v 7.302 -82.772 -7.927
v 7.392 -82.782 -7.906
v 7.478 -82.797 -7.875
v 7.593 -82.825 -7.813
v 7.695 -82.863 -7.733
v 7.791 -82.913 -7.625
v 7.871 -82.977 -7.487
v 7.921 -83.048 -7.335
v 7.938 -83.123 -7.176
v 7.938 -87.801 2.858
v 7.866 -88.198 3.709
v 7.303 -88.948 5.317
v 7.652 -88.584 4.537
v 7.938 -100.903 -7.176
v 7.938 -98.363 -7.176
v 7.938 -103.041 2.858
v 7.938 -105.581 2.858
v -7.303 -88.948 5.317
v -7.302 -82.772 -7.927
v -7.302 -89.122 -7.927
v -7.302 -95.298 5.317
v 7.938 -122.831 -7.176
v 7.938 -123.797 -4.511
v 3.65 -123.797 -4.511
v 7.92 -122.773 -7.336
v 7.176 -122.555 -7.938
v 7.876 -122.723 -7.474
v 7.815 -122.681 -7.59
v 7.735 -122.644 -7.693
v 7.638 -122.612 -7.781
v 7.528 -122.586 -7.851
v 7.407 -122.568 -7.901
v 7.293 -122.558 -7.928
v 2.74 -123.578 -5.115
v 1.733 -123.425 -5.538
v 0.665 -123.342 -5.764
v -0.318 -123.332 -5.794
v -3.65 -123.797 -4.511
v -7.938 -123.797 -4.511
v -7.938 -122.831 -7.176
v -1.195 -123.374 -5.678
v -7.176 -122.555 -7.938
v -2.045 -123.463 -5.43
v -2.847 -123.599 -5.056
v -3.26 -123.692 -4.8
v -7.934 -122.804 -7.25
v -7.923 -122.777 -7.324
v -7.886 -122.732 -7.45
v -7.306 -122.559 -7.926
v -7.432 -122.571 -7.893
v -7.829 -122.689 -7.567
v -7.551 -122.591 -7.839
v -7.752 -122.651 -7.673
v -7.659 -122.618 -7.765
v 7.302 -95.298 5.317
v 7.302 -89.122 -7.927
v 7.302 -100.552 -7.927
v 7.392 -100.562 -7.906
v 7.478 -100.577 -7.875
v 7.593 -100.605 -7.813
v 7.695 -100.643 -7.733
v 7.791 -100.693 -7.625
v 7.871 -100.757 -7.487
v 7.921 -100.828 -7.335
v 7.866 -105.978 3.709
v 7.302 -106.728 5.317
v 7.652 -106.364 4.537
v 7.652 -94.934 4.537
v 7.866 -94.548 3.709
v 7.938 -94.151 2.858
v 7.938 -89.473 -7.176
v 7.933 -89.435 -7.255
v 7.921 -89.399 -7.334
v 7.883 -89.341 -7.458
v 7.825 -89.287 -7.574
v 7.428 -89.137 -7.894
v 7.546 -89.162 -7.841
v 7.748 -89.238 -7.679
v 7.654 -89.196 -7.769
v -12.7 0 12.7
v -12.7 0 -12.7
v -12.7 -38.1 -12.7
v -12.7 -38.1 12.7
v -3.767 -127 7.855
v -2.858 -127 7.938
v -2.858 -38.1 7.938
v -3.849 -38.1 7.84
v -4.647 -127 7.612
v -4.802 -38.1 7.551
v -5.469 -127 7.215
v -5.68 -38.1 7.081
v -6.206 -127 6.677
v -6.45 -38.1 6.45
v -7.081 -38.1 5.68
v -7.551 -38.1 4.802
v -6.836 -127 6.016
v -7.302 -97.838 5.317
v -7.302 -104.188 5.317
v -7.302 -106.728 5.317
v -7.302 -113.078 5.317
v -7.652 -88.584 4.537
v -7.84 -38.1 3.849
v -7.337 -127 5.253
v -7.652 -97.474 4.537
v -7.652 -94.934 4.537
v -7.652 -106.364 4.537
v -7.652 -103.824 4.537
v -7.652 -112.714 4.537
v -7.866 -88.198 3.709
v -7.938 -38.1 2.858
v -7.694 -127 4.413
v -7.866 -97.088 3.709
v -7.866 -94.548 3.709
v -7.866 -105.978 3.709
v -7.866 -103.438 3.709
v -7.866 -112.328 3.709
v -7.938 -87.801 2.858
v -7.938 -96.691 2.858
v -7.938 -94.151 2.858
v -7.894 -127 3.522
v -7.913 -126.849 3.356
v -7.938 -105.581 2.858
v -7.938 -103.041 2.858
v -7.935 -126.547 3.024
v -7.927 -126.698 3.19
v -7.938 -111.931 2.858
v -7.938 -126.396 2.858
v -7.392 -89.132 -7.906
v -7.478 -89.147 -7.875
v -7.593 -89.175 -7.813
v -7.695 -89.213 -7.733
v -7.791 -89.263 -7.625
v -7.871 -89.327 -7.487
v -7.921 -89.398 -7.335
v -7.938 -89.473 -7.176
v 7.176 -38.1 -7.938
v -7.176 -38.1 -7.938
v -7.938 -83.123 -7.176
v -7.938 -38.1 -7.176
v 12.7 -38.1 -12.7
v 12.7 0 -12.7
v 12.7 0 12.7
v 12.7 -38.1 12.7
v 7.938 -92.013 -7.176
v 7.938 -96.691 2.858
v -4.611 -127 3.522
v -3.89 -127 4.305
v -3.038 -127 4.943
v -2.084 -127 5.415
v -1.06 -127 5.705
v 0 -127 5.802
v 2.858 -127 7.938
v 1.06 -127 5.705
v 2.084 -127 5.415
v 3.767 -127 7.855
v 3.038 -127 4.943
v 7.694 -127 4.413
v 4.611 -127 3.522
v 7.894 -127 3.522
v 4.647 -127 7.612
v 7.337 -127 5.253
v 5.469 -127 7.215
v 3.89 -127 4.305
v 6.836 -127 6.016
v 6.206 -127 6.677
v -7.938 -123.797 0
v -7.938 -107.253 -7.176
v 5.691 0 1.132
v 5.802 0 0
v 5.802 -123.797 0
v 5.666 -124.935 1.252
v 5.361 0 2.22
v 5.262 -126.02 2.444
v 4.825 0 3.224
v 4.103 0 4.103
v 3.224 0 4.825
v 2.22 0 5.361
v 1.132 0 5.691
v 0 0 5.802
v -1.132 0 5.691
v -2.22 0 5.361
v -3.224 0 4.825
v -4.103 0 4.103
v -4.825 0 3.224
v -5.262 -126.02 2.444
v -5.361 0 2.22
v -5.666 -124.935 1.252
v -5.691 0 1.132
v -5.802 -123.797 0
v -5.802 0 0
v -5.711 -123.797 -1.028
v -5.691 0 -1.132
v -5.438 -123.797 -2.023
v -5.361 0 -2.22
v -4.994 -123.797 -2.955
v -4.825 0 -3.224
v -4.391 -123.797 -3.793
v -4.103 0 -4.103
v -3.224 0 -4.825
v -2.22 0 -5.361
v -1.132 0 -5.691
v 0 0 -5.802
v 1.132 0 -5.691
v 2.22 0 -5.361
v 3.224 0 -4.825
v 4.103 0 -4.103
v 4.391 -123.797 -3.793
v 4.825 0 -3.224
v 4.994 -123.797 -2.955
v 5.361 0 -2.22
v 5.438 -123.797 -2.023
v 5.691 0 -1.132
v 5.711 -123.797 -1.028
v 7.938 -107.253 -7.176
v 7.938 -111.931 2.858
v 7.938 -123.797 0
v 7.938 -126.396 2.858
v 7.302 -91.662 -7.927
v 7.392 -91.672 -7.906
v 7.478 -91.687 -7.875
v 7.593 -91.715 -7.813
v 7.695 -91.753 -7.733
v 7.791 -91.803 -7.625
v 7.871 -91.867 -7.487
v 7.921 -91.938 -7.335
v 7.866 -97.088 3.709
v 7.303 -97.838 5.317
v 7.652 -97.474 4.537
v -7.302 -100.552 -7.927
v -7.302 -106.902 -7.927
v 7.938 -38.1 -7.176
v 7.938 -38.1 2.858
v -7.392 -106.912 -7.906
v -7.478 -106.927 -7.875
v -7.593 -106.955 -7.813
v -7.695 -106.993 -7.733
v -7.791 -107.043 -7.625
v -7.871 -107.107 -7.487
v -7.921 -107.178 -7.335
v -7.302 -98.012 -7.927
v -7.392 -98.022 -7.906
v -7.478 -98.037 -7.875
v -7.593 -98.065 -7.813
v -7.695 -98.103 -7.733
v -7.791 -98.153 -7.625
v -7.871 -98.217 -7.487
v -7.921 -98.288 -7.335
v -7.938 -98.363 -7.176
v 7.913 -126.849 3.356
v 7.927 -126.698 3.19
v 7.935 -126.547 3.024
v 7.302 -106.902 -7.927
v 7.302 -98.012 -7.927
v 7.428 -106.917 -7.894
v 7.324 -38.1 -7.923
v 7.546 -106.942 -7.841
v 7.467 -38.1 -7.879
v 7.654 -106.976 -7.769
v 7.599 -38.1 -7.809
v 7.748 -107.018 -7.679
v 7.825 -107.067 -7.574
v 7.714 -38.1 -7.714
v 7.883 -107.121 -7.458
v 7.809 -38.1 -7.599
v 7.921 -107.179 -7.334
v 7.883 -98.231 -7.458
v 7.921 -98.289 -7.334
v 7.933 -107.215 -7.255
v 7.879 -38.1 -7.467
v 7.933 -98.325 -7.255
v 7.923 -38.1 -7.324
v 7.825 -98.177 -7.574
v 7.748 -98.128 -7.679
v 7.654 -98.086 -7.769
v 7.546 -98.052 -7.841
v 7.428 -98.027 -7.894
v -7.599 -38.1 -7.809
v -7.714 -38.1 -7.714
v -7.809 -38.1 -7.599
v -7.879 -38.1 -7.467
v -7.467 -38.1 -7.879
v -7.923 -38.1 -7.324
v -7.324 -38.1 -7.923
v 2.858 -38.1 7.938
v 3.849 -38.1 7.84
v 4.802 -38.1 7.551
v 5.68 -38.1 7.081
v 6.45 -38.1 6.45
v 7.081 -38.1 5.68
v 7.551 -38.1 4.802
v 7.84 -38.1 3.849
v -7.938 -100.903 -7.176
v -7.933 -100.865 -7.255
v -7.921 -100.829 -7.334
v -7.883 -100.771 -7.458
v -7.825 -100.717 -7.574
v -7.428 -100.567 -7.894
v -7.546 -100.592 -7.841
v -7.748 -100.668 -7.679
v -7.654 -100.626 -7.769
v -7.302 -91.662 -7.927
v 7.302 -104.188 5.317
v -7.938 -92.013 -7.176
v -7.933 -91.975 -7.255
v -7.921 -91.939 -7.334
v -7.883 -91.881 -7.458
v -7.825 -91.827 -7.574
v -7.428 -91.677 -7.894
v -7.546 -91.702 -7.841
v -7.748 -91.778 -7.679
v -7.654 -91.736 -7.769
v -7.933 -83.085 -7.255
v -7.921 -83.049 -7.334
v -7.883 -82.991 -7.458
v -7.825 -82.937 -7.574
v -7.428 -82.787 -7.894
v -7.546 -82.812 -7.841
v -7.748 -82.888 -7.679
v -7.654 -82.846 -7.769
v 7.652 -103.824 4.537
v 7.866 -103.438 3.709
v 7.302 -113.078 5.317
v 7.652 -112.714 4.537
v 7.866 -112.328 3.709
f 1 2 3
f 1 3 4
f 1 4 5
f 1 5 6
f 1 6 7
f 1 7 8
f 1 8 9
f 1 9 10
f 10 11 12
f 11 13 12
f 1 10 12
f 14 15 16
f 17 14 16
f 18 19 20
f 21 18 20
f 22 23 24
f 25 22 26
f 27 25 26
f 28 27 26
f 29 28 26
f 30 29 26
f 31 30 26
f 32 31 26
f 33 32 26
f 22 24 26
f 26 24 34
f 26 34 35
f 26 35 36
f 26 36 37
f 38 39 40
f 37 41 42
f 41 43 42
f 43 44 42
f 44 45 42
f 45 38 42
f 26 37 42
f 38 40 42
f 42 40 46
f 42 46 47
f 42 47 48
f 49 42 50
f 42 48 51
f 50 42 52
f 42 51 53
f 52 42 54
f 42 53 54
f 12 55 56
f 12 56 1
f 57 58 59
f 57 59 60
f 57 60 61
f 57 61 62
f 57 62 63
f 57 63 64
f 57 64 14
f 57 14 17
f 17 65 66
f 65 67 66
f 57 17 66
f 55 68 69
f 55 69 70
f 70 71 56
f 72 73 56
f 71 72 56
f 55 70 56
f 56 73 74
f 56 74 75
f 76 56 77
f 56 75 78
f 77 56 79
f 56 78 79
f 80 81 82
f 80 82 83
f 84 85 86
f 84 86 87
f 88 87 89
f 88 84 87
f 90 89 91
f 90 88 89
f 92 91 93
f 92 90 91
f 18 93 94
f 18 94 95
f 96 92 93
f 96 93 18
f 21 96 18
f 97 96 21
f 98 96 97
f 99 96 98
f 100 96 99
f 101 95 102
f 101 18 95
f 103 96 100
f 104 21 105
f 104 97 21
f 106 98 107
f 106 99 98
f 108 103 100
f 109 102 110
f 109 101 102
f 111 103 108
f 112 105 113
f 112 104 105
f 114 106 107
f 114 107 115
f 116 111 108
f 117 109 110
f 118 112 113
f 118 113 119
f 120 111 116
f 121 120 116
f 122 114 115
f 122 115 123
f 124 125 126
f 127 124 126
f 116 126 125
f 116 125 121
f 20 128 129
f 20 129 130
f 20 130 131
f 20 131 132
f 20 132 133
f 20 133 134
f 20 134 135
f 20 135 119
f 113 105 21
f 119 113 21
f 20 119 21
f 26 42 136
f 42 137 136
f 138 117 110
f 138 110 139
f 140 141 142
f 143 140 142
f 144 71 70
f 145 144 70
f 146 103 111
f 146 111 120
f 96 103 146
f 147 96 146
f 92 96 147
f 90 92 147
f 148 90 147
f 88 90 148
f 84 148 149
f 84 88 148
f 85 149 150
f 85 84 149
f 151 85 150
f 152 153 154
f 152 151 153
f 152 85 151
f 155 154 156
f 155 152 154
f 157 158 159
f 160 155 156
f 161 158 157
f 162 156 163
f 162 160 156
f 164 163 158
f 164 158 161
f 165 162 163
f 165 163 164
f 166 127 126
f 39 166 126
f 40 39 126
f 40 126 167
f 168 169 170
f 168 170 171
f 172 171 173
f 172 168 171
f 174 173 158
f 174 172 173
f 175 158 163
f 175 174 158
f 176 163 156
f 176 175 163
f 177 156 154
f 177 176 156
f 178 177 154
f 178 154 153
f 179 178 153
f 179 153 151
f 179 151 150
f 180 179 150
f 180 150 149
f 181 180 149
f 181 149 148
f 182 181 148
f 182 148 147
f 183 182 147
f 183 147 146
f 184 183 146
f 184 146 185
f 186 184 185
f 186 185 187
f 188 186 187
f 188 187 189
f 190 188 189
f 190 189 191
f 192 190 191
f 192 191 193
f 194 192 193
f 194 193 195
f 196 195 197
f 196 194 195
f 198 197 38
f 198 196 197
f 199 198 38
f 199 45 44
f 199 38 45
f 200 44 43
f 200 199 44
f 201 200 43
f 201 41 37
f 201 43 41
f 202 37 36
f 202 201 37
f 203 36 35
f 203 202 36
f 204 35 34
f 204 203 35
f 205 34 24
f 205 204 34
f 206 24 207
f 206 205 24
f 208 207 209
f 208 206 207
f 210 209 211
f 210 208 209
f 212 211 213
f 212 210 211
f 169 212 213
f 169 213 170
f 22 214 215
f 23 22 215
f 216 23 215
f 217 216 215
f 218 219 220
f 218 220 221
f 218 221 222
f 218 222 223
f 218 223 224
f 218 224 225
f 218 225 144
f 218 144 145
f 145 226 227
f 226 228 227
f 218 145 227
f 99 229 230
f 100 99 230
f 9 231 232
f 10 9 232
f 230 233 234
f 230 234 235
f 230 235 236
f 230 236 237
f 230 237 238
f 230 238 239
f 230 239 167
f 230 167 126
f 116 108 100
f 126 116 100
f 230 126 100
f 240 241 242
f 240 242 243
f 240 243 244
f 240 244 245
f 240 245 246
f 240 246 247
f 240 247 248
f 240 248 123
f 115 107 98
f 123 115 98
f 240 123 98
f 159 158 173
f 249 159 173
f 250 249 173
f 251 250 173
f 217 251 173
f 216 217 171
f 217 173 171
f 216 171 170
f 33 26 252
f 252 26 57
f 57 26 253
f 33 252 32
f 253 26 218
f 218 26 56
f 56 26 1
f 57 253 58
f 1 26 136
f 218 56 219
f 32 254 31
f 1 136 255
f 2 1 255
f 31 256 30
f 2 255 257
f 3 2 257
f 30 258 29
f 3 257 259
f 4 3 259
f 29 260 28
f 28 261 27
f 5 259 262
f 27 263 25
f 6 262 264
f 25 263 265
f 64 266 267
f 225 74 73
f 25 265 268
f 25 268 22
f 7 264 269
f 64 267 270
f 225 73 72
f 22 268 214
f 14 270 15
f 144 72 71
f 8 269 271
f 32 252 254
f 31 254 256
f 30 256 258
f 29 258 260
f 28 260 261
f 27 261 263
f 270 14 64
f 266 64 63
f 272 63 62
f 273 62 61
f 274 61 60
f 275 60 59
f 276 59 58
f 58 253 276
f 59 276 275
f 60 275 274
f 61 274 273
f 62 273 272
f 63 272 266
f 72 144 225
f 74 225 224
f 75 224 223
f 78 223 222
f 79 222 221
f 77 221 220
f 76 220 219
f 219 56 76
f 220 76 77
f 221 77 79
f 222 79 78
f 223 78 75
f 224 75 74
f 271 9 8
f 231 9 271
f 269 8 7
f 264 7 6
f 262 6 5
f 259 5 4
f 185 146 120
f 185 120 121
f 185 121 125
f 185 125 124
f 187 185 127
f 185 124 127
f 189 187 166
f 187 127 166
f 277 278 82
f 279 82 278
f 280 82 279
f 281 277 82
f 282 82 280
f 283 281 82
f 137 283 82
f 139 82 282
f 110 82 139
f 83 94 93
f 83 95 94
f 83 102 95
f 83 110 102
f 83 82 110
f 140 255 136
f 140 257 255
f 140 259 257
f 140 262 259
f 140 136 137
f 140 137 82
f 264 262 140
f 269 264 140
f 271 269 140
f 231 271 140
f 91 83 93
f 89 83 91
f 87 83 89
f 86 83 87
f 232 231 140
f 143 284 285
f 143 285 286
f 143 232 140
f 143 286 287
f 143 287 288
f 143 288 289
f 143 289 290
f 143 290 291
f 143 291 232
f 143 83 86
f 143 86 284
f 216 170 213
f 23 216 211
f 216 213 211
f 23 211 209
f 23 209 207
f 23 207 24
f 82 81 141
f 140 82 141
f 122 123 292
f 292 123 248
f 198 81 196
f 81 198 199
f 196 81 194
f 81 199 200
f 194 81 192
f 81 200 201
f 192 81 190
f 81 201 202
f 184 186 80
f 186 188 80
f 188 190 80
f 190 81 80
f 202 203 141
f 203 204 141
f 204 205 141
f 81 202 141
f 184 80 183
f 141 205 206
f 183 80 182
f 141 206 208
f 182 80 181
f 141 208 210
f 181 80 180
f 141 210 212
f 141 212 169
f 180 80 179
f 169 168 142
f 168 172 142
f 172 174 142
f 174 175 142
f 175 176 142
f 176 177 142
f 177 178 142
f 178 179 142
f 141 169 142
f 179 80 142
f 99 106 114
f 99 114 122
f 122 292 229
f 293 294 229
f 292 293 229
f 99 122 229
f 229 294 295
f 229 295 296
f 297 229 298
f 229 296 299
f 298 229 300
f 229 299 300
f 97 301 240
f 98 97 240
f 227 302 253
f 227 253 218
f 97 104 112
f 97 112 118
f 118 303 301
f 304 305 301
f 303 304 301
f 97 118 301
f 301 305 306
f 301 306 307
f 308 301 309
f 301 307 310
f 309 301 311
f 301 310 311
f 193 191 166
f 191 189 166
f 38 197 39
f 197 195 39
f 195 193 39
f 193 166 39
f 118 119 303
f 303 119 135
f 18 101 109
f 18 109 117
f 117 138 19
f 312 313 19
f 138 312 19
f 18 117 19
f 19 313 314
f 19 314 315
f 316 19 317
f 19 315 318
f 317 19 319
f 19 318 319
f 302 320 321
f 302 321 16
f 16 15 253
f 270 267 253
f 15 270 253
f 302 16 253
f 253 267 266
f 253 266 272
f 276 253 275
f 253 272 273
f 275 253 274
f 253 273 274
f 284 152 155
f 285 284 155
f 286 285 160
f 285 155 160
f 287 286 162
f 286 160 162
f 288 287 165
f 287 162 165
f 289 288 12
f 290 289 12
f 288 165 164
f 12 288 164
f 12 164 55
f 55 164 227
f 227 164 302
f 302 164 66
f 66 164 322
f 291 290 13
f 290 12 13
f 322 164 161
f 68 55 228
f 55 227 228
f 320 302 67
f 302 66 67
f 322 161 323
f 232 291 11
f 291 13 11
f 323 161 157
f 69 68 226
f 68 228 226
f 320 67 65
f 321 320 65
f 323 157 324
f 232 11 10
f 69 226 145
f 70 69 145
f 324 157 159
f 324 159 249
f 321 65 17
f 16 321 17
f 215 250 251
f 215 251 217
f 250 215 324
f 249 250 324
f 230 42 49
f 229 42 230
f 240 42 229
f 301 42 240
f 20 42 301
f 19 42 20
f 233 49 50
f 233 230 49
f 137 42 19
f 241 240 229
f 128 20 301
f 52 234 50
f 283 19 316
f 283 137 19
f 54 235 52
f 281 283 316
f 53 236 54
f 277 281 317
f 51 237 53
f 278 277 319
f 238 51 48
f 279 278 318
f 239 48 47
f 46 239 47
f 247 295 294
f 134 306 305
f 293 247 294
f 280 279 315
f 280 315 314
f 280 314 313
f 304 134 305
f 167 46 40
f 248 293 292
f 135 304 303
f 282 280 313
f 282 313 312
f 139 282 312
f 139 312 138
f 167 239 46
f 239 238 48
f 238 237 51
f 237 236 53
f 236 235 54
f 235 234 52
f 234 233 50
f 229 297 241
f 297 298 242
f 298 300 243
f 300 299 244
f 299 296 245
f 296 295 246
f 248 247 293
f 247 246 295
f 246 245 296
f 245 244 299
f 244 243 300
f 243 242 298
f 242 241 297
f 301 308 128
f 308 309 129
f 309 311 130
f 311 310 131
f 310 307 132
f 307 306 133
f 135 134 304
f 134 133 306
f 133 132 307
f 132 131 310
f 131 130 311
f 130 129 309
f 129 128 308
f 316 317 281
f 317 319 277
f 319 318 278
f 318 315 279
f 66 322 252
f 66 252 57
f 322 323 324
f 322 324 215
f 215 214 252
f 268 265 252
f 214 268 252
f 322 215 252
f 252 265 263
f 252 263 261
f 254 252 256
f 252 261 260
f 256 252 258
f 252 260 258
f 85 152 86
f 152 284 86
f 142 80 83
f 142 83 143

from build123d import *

# Parameters (mm, degrees)
F0_W        = 25.4
F0_H        = 25.4
F1_DEPTH    = 38.1
F0_R        = 5.8024107256
F2_DEPTH    = 127
F3_DEPTH    = 127
F5_DEPTH    = 0.635
F7_DEPTH    = 0.635
F8_F1_R     = 5.08
F8_F2_R     = 5.08
F9_T1_DEPTH = 29.2466340732
F9_T3_DEPTH = 49.2393659268
F9_T5_DEPTH = 11.684
F9_T7_DEPTH = 11.684
F11_DEPTH   = 25.4
F13_DEPTH   = 25.4


# Not quite as in the source:
# - a fillet or chamfer that OpenCascade refuses, or shapes differently, is made with other operations: its cross-section is extruded or revolved along the edge and cut away or added


with BuildPart() as f1:
    # F0 (on Front) → F1 (new body)
    with BuildSketch(Plane.XZ):
        Rectangle(F0_W, F0_H)
        Polygon((7.9375, 7.9375), (7.9375, 0), (7.9375, -7.9375), (0, -7.9375), (-7.9375, -7.9375), (-7.9375, 0), (-7.9375, 7.9375), (0, 7.9375), align=None, mode=Mode.SUBTRACT)
    extrude(amount=F1_DEPTH)



with BuildPart() as f1b:
    # F0 (on Front) → F1, piece 2 (new body)
    with BuildSketch(Plane.XZ):
        with BuildLine():
            ThreePointArc((0, -7.9375), (5.6126600757, -5.6126600757), (7.9375, 0))
            ThreePointArc((7.9375, 0), (5.6126600757, 5.6126600757), (0, 7.9375))
            ThreePointArc((0, 7.9375), (-5.6126600757, 5.6126600757), (-7.9375, 0))
            ThreePointArc((-7.9375, 0), (-5.6126600757, -5.6126600757), (0, -7.9375))
        make_face()
        Circle(F0_R, mode=Mode.SUBTRACT)
    extrude(amount=F1_DEPTH)


with BuildPart() as f1_1:
    add(f1.part)

    add(f1b.part)  # F2 merges F1b
    # F0 (on Front) → F2 (join)
    with BuildSketch(Plane.XZ):
        with BuildLine():
            ThreePointArc((0, -7.9375), (5.6126600757, -5.6126600757), (7.9375, 0))
            ThreePointArc((7.9375, 0), (5.6126600757, 5.6126600757), (0, 7.9375))
            ThreePointArc((0, 7.9375), (-5.6126600757, 5.6126600757), (-7.9375, 0))
            ThreePointArc((-7.9375, 0), (-5.6126600757, -5.6126600757), (0, -7.9375))
        make_face()
        Circle(F0_R, mode=Mode.SUBTRACT)
    extrude(amount=F2_DEPTH)

    # F0 (on Front) → F3 (join)
    with BuildSketch(Plane.XZ):
        with BuildLine():
            Line((7.9375, -7.9375), (7.9375, 0))
            ThreePointArc((7.9375, 0), (5.6126600757, -5.6126600757), (0, -7.9375))
            Line((0, -7.9375), (7.9375, -7.9375))
        make_face()
        with BuildLine():
            ThreePointArc((0, 7.9375), (5.6126600757, 5.6126600757), (7.9375, 0))
            Line((7.9375, 0), (7.9375, 7.9375))
            Line((7.9375, 7.9375), (0, 7.9375))
        make_face()
        with BuildLine():
            ThreePointArc((-7.9375, 0), (-5.6126600757, 5.6126600757), (0, 7.9375))
            Line((0, 7.9375), (-7.9375, 7.9375))
            Line((-7.9375, 7.9375), (-7.9375, 0))
        make_face()
        with BuildLine():
            Line((-7.9375, -7.9375), (0, -7.9375))
            ThreePointArc((0, -7.9375), (-5.6126600757, -5.6126600757), (-7.9375, 0))
            Line((-7.9375, 0), (-7.9375, -7.9375))
        make_face()
    extrude(amount=F3_DEPTH)

    # F4 (on face) → F5 (cut)
    with BuildSketch(Plane(origin=(-7.9375, 0, 0), x_dir=(0, -1, 0), z_dir=(-1, 0, 0))):
        Polygon((106.8973659268, -7.9375), (114.3, 7.9375), (107.95, 7.9375), (100.5473659268, -7.9375), align=None)
        Polygon((98.0073659268, -7.9375002533), (105.41, 7.9374997467), (99.06, 7.9374997467), (91.6573659268, -7.9375002533), align=None)
        Polygon((89.1173659268, -7.9375002533), (96.52, 7.9374997467), (90.17, 7.9374997467), (82.7673659268, -7.9375002533), align=None)
    extrude(amount=-F5_DEPTH, mode=Mode.SUBTRACT)

    # F6 (on face) → F7 (cut)
    with BuildSketch(Plane.YZ.offset(7.9375)):
        Polygon((-107.95, 7.9375), (-114.3, 7.9375), (-106.8973659268, -7.9375), (-100.5473659268, -7.9375), align=None)
        Polygon((-99.06, 7.9374997467), (-105.41, 7.9374997467), (-98.0073659268, -7.9375002533), (-91.6573659268, -7.9375002533), align=None)
        Polygon((-90.17, 7.9374997467), (-96.52, 7.9374997467), (-89.1173659268, -7.9375002533), (-82.7673659268, -7.9375002533), align=None)
    extrude(amount=-F7_DEPTH, mode=Mode.SUBTRACT)

    # F8: fillet of radius 5.08 on 8 edges, made by hand

    # F8_f1
    f8_f1_edges = [f1_1.edges().sort_by_distance(p)[0] for p in [
        (-7.9375, -120.65, 7.9375),
    ]]
    fillet(f8_f1_edges, radius=F8_F1_R)

    # F8_f2
    f8_f2_edges = [f1_1.edges().sort_by_distance(p)[0] for p in [
        (7.9375, -120.65, 7.9375),
    ]]
    fillet(f8_f2_edges, radius=F8_F2_R)

    # F9: fillet of radius 0.762 on 8 edges, made by hand

    # F9_s2 → F9_t1 (cut)
    with BuildSketch(Plane.XZ.offset(102.3253659268)):
        with BuildLine():
            ThreePointArc((-7.9375, -7.1755), (-7.7143153673, -7.7143153673), (-7.1755, -7.9375))
            Line((-7.1755, -7.9375), (-7.1755, -7.95274))
            Line((-7.1755, -7.95274), (-7.95274, -7.95274))
            Line((-7.95274, -7.95274), (-7.95274, -7.1755))
            Line((-7.95274, -7.1755), (-7.9375, -7.1755))
        make_face()
        with BuildLine():
            ThreePointArc((7.9375, -7.1755), (7.7143153673, -7.7143153673), (7.1755, -7.9375))
            Line((7.1755, -7.9375), (7.1755, -7.95274))
            Line((7.1755, -7.95274), (7.95274, -7.95274))
            Line((7.95274, -7.95274), (7.95274, -7.1755))
            Line((7.95274, -7.1755), (7.9375, -7.1755))
        make_face()
    extrude(amount=F9_T1_DEPTH, mode=Mode.SUBTRACT)

    # F9_s4 → F9_t3 (cut)
    with BuildSketch(Plane.XZ.offset(38.1)):
        with BuildLine():
            ThreePointArc((7.1755, -7.9375), (7.7143153673, -7.7143153673), (7.9375, -7.1755))
            Line((7.9375, -7.1755), (7.95274, -7.1755))
            Line((7.95274, -7.1755), (7.95274, -7.95274))
            Line((7.95274, -7.95274), (7.1755, -7.95274))
            Line((7.1755, -7.95274), (7.1755, -7.9375))
        make_face()
        with BuildLine():
            ThreePointArc((-7.1755, -7.9375), (-7.7143153673, -7.7143153673), (-7.9375, -7.1755))
            Line((-7.9375, -7.1755), (-7.95274, -7.1755))
            Line((-7.95274, -7.1755), (-7.95274, -7.95274))
            Line((-7.95274, -7.95274), (-7.1755, -7.95274))
            Line((-7.1755, -7.95274), (-7.1755, -7.9375))
        make_face()
    extrude(amount=F9_T3_DEPTH, mode=Mode.SUBTRACT)

    # F9_s6 → F9_t5 (cut)
    with BuildSketch(Plane.XZ.offset(84.5453659268)):
        with BuildLine():
            ThreePointArc((7.1755, -7.9375), (7.7143153673, -7.7143153673), (7.9375, -7.1755))
            Line((7.9375, -7.1755), (7.95274, -7.1755))
            Line((7.95274, -7.1755), (7.95274, -7.95274))
            Line((7.95274, -7.95274), (7.1755, -7.95274))
            Line((7.1755, -7.95274), (7.1755, -7.9375))
        make_face()
        with BuildLine():
            ThreePointArc((-7.1755, -7.9375), (-7.7143153673, -7.7143153673), (-7.9375, -7.1755))
            Line((-7.9375, -7.1755), (-7.95274, -7.1755))
            Line((-7.95274, -7.1755), (-7.95274, -7.95274))
            Line((-7.95274, -7.95274), (-7.1755, -7.95274))
            Line((-7.1755, -7.95274), (-7.1755, -7.9375))
        make_face()
    extrude(amount=F9_T5_DEPTH, mode=Mode.SUBTRACT)

    # F9_s8 → F9_t7 (cut)
    with BuildSketch(Plane.XZ.offset(93.4353659268)):
        with BuildLine():
            ThreePointArc((7.1755, -7.9375), (7.7143153673, -7.7143153673), (7.9375, -7.1755))
            Line((7.9375, -7.1755), (7.95274, -7.1755))
            Line((7.95274, -7.1755), (7.95274, -7.95274))
            Line((7.95274, -7.95274), (7.1755, -7.95274))
            Line((7.1755, -7.95274), (7.1755, -7.9375))
        make_face()
        with BuildLine():
            ThreePointArc((-7.1755, -7.9375), (-7.7143153673, -7.7143153673), (-7.9375, -7.1755))
            Line((-7.9375, -7.1755), (-7.95274, -7.1755))
            Line((-7.95274, -7.1755), (-7.95274, -7.95274))
            Line((-7.95274, -7.95274), (-7.1755, -7.95274))
            Line((-7.1755, -7.95274), (-7.1755, -7.9375))
        make_face()
    extrude(amount=F9_T7_DEPTH, mode=Mode.SUBTRACT)

    # F10 (on face) → F11 (cut)
    with BuildSketch(Plane(origin=(-7.9375, 0, 0), x_dir=(0, -1, 0), z_dir=(-1, 0, 0))):
        Polygon((139.3916606903, 2.8575), (129.1201191025, 15.1211110401), (129.6502673187, -9.5306912246), align=None)
    extrude(amount=-F11_DEPTH, mode=Mode.SUBTRACT)

    # F12 (on face) → F13 (cut)
    with BuildSketch(Plane(origin=(-7.9375, 0, 0), x_dir=(0, -1, 0), z_dir=(-1, 0, 0))):
        Polygon((131.4901411533, -9.1816671193), (131.4901411533, 8.4584709257), (123.7966120243, 0), (123.7966120243, -4.5106001198), (121.0489347577, -12.0942108333), align=None)
    extrude(amount=-F13_DEPTH, mode=Mode.SUBTRACT)


solid = f1_1.part
